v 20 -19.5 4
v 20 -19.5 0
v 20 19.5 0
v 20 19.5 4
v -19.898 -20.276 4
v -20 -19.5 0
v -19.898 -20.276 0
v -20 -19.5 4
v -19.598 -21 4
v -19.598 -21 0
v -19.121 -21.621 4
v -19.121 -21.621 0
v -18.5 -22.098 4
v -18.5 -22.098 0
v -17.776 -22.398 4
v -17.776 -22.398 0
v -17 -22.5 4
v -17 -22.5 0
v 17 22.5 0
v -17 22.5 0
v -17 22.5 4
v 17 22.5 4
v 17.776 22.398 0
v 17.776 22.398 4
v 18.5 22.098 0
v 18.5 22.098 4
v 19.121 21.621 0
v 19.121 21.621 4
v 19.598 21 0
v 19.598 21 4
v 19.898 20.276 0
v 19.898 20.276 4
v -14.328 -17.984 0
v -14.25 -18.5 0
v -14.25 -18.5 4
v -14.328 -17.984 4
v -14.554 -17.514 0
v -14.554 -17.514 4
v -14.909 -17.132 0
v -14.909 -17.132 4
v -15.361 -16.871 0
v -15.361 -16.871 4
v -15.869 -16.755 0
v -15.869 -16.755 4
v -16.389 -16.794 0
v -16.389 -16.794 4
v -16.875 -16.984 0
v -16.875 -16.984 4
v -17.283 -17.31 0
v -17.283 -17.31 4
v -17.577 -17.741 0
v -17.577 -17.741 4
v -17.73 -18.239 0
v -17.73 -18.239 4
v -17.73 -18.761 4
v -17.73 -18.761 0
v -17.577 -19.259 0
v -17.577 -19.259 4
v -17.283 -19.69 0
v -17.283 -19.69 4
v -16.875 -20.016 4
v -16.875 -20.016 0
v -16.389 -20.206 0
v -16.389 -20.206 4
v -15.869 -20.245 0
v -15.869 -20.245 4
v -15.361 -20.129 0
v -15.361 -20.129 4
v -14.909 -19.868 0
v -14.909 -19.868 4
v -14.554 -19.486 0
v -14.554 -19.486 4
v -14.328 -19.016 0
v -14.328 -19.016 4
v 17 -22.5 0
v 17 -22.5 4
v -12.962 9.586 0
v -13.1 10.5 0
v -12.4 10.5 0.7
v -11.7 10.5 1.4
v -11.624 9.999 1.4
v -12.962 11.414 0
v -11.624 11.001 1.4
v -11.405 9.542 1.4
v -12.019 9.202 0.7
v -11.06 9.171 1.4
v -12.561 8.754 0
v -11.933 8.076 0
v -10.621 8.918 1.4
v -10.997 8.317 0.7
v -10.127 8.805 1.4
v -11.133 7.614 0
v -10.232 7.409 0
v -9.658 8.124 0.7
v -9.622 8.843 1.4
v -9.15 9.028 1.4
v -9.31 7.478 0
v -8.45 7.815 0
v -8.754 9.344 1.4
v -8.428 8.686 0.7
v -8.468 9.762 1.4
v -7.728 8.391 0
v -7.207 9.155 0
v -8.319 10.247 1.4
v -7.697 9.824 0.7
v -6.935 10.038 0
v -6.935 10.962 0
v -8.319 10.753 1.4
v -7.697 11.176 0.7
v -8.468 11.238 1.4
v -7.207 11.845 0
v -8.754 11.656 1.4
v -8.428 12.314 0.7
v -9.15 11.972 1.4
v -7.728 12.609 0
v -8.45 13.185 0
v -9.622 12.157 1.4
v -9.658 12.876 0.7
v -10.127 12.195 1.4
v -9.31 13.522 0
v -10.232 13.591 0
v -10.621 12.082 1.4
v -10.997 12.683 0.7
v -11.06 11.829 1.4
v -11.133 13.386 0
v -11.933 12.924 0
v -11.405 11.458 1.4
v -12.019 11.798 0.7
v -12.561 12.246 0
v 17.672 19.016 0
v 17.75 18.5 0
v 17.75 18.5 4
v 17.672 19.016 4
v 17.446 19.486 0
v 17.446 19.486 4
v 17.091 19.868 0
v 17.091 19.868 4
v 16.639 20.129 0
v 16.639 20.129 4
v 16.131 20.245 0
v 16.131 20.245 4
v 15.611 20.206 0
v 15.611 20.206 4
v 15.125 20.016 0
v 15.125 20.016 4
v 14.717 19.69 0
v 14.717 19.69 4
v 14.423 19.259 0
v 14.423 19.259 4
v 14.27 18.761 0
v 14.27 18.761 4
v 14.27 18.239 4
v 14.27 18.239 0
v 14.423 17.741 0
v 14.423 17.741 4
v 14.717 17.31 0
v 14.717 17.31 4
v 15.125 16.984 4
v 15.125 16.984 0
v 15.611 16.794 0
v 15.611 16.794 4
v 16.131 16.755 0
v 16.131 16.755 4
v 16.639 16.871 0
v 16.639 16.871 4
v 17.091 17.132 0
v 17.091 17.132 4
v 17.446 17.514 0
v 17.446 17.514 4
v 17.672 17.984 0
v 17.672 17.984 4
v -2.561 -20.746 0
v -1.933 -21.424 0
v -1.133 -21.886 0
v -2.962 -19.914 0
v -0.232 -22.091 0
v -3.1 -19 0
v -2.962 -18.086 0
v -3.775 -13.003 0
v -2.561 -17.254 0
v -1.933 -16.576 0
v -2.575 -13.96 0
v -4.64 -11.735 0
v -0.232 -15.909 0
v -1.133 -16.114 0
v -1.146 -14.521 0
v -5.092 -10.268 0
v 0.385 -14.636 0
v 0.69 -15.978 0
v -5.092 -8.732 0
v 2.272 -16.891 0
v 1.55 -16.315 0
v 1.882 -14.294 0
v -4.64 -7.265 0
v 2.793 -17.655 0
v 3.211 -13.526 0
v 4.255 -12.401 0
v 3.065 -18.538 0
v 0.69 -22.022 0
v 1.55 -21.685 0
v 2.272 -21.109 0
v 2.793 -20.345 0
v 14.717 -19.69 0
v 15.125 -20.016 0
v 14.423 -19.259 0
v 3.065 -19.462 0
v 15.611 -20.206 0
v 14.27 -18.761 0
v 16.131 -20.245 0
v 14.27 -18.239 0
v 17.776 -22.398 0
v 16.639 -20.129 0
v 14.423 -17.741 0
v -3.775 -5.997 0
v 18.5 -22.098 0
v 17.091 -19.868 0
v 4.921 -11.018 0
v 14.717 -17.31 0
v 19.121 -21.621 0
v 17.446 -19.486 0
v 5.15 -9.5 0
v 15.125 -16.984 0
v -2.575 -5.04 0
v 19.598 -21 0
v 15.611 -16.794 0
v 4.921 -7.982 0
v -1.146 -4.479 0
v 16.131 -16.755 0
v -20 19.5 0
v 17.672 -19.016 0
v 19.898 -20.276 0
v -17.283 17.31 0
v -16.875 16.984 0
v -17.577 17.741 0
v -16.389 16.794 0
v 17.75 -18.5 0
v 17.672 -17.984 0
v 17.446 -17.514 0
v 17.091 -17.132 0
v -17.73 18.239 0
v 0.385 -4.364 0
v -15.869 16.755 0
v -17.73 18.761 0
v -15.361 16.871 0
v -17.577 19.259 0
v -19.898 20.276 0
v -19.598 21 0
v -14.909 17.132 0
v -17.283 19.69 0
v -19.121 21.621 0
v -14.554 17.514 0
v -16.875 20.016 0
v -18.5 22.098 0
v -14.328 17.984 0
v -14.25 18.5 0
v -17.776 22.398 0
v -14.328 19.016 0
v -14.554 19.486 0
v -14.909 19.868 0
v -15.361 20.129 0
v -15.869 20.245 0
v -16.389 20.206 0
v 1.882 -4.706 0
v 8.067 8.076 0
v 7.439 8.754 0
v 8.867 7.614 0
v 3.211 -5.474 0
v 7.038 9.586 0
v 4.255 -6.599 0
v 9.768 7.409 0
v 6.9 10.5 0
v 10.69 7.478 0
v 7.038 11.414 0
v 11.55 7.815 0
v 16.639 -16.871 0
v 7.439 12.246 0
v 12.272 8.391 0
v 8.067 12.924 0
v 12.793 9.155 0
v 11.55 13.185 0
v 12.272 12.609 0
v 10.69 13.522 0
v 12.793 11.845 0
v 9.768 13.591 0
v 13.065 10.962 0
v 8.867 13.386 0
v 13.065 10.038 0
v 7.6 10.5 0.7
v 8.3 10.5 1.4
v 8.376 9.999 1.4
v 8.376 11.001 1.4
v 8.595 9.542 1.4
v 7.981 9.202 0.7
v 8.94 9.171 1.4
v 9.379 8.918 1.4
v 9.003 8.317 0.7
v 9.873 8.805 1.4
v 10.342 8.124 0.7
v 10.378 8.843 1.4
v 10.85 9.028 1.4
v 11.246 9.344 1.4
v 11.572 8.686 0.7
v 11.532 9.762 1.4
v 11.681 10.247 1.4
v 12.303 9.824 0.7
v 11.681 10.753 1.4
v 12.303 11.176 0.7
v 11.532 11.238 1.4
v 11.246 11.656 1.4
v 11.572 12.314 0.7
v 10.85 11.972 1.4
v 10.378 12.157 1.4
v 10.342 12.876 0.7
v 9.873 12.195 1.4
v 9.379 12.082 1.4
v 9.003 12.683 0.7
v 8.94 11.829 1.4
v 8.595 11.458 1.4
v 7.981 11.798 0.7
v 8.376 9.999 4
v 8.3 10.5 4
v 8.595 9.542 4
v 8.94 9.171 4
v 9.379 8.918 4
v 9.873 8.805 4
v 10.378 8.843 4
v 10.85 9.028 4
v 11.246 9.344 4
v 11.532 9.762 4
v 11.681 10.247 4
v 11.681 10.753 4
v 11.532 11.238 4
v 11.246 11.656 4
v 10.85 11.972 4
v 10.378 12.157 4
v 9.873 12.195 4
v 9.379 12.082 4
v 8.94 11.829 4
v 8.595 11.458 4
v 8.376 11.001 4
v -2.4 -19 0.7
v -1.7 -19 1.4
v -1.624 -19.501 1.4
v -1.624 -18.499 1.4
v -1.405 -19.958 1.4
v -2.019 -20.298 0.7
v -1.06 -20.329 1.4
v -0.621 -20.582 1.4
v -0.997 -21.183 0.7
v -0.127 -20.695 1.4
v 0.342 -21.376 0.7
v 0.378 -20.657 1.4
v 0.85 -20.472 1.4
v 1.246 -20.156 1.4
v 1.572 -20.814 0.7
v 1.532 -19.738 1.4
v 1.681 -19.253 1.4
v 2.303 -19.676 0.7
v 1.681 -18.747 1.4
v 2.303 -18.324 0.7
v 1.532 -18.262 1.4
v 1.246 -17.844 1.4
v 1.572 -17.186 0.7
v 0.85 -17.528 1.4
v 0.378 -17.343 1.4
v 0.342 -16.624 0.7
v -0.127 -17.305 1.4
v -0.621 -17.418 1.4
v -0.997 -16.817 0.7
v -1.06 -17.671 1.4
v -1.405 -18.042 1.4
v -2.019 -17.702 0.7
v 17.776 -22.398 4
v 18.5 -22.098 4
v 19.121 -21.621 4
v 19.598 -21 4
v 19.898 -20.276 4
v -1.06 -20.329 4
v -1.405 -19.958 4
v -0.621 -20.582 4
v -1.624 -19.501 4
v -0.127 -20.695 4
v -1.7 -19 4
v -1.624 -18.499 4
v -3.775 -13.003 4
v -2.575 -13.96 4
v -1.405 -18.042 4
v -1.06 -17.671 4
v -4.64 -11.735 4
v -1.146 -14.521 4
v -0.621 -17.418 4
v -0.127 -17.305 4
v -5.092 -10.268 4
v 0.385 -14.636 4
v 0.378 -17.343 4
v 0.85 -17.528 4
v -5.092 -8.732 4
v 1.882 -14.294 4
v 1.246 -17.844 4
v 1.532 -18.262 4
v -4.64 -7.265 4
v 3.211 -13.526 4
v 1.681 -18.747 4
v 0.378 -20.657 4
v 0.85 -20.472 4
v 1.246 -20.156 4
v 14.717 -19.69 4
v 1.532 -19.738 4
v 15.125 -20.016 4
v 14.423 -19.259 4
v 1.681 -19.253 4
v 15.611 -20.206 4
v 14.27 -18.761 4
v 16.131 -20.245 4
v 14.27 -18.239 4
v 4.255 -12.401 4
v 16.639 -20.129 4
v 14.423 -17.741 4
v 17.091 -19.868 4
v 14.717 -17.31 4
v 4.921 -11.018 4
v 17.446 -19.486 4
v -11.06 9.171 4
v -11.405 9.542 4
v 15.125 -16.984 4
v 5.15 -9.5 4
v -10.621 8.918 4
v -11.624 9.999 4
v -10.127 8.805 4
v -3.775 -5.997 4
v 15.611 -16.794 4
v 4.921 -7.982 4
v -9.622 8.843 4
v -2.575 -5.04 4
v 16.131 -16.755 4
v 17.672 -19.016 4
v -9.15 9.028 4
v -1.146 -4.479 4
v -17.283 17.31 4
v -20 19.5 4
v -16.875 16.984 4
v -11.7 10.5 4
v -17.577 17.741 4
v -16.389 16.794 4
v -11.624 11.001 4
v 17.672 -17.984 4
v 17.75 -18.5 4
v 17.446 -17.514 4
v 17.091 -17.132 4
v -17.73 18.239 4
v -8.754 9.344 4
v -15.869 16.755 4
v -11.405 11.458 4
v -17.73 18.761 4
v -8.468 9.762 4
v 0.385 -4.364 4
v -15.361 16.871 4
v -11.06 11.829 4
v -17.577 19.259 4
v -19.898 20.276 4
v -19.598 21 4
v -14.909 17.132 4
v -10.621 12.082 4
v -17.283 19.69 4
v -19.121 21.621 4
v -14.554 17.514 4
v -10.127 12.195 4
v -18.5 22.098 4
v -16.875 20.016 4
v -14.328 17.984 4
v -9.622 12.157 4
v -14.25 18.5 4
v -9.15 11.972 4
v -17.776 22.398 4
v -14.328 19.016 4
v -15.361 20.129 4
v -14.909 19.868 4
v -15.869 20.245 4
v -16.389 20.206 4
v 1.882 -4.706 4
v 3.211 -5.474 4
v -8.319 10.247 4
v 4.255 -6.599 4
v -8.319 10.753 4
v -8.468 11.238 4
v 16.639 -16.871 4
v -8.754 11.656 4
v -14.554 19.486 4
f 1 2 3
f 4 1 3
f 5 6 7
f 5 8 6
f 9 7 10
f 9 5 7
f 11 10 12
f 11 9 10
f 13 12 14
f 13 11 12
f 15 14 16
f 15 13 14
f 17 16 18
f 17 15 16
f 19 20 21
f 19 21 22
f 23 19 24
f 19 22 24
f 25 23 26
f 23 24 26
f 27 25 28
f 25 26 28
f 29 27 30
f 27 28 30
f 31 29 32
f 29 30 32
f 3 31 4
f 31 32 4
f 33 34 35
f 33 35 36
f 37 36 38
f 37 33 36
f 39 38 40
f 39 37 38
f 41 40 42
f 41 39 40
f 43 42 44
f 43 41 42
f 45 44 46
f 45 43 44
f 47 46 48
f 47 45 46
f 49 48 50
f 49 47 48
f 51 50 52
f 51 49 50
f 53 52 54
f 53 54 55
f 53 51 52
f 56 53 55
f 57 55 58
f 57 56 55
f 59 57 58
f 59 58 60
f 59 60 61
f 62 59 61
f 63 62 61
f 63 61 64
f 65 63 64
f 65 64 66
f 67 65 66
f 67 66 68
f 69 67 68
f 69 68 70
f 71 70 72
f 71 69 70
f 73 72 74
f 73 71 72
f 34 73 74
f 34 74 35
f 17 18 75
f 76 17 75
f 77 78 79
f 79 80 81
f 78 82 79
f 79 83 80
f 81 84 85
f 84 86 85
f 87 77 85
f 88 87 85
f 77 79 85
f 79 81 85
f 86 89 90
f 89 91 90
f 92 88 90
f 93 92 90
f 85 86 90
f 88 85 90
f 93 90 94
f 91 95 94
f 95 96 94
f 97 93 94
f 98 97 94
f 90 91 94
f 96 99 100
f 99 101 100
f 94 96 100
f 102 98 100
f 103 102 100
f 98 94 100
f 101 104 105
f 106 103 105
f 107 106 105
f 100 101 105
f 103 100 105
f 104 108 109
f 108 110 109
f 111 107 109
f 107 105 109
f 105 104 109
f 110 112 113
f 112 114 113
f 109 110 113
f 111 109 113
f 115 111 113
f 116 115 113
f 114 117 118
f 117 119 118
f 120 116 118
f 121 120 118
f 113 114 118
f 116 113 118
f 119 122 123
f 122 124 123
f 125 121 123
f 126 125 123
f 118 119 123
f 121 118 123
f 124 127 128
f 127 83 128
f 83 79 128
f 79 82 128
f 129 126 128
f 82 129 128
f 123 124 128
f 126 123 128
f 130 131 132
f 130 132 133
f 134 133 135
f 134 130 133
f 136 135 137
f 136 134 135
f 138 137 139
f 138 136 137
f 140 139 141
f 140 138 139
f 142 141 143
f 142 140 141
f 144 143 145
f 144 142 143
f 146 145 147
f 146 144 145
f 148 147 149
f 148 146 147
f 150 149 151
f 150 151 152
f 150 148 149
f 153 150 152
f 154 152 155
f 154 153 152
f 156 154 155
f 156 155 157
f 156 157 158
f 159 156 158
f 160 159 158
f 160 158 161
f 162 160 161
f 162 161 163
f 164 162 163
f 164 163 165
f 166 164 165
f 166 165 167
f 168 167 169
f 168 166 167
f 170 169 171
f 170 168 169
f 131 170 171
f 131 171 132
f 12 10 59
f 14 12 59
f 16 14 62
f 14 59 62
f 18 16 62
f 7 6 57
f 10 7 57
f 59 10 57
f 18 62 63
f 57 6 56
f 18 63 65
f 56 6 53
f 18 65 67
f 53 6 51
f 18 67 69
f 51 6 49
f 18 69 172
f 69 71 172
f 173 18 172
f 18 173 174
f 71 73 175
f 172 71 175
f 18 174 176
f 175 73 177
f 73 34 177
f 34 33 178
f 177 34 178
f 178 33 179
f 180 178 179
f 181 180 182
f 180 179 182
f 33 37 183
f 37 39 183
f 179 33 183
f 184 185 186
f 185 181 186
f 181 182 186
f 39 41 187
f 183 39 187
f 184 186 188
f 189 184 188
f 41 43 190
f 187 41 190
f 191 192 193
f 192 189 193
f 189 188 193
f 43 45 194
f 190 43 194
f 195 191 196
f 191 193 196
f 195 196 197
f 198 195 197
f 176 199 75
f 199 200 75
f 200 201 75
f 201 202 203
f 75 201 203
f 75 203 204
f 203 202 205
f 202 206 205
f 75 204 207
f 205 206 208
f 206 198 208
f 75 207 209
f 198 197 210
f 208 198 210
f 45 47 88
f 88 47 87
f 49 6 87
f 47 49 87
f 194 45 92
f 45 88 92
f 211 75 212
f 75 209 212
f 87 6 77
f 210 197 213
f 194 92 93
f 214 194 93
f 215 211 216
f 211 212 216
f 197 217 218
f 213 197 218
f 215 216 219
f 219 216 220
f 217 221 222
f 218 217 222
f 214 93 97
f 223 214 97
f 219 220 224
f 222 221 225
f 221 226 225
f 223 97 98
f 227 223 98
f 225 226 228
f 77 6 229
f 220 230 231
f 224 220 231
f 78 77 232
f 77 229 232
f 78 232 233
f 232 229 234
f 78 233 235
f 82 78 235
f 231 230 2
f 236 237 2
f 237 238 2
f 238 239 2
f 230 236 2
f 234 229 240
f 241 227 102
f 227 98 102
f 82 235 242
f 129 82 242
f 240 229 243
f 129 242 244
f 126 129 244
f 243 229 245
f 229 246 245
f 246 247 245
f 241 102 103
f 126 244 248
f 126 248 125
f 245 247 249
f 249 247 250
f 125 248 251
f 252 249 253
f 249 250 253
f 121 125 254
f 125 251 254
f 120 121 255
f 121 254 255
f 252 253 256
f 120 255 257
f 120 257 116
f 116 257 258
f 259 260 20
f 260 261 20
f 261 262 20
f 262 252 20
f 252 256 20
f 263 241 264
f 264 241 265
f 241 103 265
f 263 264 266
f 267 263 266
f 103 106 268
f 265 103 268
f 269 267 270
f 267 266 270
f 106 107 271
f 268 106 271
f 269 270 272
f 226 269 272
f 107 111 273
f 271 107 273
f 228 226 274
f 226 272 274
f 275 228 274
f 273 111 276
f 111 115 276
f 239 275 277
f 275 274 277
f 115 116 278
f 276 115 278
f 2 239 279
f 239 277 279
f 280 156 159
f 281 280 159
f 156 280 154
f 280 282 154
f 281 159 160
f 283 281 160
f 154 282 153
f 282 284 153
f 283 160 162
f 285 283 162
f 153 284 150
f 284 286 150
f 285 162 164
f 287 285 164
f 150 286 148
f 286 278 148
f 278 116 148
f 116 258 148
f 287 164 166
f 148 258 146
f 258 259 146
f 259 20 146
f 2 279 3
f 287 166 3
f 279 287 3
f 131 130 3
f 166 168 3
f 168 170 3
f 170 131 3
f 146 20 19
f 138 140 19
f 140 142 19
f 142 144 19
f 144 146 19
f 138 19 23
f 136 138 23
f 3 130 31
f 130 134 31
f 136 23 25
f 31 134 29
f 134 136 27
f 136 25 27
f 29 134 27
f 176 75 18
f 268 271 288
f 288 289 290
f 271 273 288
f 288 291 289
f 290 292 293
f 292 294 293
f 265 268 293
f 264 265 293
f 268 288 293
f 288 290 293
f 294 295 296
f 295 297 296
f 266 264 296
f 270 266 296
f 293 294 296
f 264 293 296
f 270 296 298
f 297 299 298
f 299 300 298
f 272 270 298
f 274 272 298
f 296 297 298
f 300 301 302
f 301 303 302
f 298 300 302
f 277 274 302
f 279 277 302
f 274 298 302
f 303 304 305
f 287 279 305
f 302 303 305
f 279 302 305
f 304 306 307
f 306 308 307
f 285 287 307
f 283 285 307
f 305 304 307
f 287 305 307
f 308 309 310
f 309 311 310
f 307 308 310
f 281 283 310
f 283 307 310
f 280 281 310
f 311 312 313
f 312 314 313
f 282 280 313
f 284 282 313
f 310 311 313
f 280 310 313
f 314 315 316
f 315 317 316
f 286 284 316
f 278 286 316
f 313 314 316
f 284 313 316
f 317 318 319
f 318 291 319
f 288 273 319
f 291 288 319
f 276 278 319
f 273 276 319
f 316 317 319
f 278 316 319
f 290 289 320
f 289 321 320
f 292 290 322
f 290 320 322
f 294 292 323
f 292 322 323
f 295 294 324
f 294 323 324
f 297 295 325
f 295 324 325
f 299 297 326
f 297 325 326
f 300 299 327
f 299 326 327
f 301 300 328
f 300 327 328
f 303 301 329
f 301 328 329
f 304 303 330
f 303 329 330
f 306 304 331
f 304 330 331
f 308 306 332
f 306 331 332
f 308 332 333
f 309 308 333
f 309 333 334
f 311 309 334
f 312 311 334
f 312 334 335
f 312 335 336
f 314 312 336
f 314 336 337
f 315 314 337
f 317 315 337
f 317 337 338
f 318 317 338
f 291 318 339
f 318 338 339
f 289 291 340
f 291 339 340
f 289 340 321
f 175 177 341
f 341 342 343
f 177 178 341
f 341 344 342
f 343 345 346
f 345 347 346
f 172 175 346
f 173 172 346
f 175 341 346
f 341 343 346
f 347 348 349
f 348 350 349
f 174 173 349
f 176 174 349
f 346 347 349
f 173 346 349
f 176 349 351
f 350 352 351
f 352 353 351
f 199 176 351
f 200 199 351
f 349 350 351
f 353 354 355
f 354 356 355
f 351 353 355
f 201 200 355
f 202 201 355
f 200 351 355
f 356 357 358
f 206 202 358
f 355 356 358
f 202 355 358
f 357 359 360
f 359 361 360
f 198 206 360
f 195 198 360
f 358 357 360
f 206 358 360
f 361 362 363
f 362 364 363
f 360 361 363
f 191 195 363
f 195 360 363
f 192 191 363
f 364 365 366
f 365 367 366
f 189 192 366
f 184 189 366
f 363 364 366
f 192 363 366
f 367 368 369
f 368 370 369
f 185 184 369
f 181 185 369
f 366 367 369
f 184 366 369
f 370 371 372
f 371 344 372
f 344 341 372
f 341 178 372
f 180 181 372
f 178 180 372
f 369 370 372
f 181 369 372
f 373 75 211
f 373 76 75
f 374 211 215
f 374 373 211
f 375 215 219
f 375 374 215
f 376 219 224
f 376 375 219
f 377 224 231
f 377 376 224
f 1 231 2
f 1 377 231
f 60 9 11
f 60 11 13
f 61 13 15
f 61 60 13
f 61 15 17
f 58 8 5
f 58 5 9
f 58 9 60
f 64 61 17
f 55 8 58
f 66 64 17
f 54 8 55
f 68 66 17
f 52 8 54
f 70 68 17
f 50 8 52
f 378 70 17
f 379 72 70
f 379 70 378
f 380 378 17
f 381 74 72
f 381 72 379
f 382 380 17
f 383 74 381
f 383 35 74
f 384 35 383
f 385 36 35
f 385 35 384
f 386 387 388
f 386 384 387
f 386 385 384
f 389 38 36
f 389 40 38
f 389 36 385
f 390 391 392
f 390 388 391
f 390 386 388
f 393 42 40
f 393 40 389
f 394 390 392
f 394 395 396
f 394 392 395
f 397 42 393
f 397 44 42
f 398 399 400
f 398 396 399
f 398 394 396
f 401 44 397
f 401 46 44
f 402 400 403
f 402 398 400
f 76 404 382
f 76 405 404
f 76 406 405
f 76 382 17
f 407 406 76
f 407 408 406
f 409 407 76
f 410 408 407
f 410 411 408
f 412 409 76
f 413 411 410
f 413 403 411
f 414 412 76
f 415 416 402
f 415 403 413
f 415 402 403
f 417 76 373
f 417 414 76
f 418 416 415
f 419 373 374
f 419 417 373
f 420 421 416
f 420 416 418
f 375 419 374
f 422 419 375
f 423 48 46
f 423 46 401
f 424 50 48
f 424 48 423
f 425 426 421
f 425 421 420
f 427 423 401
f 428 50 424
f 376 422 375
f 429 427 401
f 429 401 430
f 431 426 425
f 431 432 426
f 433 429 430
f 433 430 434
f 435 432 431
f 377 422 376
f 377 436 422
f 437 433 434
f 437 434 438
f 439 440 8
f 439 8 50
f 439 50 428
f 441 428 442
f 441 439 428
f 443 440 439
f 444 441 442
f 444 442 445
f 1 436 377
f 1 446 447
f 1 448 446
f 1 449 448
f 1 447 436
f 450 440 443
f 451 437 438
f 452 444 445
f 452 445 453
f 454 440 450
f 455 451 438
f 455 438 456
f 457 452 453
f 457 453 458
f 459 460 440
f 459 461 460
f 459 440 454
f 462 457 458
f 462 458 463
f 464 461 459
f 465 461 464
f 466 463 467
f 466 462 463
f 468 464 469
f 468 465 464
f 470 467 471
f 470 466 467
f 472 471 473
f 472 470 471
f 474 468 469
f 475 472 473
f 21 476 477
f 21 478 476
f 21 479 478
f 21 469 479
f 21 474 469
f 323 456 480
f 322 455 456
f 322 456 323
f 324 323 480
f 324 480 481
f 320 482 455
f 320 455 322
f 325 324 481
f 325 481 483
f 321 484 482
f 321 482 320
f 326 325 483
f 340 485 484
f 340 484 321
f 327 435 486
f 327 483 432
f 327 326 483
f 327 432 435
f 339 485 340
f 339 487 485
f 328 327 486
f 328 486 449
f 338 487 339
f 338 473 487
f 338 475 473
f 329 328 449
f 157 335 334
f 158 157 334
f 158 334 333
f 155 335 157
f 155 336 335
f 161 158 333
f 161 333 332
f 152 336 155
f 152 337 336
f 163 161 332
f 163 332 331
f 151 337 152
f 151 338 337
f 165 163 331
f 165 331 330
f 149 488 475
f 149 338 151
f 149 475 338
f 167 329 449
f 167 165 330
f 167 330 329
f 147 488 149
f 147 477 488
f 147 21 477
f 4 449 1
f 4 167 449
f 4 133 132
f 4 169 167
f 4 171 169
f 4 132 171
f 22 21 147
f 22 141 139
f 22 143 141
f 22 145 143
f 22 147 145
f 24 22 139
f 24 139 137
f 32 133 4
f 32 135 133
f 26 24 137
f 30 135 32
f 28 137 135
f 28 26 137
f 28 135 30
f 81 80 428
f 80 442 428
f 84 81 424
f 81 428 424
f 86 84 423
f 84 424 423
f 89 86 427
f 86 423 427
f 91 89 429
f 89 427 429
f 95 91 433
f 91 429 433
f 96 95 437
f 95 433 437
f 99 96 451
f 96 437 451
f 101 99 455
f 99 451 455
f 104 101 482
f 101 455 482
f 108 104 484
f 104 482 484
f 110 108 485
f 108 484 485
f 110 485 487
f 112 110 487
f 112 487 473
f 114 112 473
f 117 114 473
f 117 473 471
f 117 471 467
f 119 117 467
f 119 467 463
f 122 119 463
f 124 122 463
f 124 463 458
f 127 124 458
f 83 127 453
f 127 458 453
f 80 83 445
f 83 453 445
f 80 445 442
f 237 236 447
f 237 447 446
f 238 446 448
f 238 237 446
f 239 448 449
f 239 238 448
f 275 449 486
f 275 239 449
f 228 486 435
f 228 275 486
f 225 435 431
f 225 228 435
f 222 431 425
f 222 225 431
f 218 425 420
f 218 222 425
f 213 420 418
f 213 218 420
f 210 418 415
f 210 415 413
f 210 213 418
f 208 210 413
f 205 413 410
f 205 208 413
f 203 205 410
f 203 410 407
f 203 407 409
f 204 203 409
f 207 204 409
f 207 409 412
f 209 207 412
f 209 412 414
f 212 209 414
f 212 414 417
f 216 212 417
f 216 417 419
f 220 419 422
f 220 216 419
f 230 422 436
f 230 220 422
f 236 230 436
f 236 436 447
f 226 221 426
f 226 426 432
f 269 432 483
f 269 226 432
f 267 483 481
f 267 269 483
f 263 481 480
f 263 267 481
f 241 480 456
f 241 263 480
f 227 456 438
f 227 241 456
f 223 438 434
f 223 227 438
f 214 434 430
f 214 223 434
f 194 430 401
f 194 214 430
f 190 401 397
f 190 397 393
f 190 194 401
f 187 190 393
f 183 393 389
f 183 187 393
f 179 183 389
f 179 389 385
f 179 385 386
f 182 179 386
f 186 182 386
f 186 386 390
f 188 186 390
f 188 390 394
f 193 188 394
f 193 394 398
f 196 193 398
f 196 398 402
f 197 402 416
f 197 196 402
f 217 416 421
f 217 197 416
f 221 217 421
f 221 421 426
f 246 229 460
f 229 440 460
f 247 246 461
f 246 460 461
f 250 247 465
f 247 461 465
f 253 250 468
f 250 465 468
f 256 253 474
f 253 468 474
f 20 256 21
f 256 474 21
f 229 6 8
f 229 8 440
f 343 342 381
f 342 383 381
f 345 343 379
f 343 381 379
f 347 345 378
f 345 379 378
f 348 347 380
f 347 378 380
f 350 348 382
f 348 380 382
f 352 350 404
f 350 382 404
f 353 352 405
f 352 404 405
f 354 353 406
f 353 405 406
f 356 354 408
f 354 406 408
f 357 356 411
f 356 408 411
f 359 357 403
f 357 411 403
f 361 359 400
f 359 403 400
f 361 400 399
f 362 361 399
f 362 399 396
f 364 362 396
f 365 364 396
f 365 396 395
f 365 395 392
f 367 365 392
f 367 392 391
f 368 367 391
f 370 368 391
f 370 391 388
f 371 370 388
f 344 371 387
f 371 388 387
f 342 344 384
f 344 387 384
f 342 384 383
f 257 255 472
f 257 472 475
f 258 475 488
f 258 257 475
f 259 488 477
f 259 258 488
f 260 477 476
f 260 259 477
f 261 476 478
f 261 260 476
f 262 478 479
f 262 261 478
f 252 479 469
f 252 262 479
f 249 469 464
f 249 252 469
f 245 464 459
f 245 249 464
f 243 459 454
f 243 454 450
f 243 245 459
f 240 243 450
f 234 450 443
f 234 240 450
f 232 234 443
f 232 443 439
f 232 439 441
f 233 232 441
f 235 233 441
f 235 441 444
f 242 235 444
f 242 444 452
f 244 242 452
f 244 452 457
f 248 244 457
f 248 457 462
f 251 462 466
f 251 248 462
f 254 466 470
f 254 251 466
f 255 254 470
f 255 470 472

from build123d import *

# Parameters (mm, degrees)
SKETCH023_W         = 40
SKETCH023_H         = 45
SKETCH023_R         = 1.75
SKETCH023_R_2       = 5.15
SKETCH023_R_3       = 1.6
PAD007_DEPTH        = 4
FILLET005_R         = 3
HOLE001_D           = 3.4
HOLE001_DEPTH       = 25
HOLE001_CSINK_D     = 6.2
HOLE001_CSINK_ANGLE = 90


with BuildPart() as part:
    # Sketch023 → Pad007 (new body)
    with BuildSketch(Plane.XY):
        Rectangle(SKETCH023_W, SKETCH023_H)
        with Locations((-16, 18.5)):
            Circle(SKETCH023_R, mode=Mode.SUBTRACT)
        with Locations((16, 18.5)):
            Circle(SKETCH023_R, mode=Mode.SUBTRACT)
        with Locations((16, -18.5)):
            Circle(SKETCH023_R, mode=Mode.SUBTRACT)
        with Locations((-16, -18.5)):
            Circle(SKETCH023_R, mode=Mode.SUBTRACT)
        with Locations((0, -9.5)):
            Circle(SKETCH023_R_2, mode=Mode.SUBTRACT)
        with Locations((0, -19)):
            Circle(SKETCH023_R_3, mode=Mode.SUBTRACT)
        with Locations((-10, 10.5)):
            Circle(SKETCH023_R_3, mode=Mode.SUBTRACT)
        with Locations((10, 10.5)):
            Circle(SKETCH023_R_3, mode=Mode.SUBTRACT)
    extrude(amount=PAD007_DEPTH)

    # Fillet005
    fillet005_edges = [part.edges().sort_by_distance(p)[0] for p in [
        (20, 22.5, 2),
        (-20, -22.5, 2),
        (-20, 22.5, 2),
        (20, -22.5, 2),
    ]]
    fillet(fillet005_edges, radius=FILLET005_R)

    # Hole001
    with Locations(Plane(origin=(0, 0, 0), x_dir=(1, 0, 0), z_dir=(0, 0, -1))):
        with Locations((0, 19), (10, -10.5), (-10, -10.5)):
            CounterSinkHole(HOLE001_D / 2, HOLE001_CSINK_D / 2, depth=HOLE001_DEPTH, counter_sink_angle=HOLE001_CSINK_ANGLE)


solid = part.part
